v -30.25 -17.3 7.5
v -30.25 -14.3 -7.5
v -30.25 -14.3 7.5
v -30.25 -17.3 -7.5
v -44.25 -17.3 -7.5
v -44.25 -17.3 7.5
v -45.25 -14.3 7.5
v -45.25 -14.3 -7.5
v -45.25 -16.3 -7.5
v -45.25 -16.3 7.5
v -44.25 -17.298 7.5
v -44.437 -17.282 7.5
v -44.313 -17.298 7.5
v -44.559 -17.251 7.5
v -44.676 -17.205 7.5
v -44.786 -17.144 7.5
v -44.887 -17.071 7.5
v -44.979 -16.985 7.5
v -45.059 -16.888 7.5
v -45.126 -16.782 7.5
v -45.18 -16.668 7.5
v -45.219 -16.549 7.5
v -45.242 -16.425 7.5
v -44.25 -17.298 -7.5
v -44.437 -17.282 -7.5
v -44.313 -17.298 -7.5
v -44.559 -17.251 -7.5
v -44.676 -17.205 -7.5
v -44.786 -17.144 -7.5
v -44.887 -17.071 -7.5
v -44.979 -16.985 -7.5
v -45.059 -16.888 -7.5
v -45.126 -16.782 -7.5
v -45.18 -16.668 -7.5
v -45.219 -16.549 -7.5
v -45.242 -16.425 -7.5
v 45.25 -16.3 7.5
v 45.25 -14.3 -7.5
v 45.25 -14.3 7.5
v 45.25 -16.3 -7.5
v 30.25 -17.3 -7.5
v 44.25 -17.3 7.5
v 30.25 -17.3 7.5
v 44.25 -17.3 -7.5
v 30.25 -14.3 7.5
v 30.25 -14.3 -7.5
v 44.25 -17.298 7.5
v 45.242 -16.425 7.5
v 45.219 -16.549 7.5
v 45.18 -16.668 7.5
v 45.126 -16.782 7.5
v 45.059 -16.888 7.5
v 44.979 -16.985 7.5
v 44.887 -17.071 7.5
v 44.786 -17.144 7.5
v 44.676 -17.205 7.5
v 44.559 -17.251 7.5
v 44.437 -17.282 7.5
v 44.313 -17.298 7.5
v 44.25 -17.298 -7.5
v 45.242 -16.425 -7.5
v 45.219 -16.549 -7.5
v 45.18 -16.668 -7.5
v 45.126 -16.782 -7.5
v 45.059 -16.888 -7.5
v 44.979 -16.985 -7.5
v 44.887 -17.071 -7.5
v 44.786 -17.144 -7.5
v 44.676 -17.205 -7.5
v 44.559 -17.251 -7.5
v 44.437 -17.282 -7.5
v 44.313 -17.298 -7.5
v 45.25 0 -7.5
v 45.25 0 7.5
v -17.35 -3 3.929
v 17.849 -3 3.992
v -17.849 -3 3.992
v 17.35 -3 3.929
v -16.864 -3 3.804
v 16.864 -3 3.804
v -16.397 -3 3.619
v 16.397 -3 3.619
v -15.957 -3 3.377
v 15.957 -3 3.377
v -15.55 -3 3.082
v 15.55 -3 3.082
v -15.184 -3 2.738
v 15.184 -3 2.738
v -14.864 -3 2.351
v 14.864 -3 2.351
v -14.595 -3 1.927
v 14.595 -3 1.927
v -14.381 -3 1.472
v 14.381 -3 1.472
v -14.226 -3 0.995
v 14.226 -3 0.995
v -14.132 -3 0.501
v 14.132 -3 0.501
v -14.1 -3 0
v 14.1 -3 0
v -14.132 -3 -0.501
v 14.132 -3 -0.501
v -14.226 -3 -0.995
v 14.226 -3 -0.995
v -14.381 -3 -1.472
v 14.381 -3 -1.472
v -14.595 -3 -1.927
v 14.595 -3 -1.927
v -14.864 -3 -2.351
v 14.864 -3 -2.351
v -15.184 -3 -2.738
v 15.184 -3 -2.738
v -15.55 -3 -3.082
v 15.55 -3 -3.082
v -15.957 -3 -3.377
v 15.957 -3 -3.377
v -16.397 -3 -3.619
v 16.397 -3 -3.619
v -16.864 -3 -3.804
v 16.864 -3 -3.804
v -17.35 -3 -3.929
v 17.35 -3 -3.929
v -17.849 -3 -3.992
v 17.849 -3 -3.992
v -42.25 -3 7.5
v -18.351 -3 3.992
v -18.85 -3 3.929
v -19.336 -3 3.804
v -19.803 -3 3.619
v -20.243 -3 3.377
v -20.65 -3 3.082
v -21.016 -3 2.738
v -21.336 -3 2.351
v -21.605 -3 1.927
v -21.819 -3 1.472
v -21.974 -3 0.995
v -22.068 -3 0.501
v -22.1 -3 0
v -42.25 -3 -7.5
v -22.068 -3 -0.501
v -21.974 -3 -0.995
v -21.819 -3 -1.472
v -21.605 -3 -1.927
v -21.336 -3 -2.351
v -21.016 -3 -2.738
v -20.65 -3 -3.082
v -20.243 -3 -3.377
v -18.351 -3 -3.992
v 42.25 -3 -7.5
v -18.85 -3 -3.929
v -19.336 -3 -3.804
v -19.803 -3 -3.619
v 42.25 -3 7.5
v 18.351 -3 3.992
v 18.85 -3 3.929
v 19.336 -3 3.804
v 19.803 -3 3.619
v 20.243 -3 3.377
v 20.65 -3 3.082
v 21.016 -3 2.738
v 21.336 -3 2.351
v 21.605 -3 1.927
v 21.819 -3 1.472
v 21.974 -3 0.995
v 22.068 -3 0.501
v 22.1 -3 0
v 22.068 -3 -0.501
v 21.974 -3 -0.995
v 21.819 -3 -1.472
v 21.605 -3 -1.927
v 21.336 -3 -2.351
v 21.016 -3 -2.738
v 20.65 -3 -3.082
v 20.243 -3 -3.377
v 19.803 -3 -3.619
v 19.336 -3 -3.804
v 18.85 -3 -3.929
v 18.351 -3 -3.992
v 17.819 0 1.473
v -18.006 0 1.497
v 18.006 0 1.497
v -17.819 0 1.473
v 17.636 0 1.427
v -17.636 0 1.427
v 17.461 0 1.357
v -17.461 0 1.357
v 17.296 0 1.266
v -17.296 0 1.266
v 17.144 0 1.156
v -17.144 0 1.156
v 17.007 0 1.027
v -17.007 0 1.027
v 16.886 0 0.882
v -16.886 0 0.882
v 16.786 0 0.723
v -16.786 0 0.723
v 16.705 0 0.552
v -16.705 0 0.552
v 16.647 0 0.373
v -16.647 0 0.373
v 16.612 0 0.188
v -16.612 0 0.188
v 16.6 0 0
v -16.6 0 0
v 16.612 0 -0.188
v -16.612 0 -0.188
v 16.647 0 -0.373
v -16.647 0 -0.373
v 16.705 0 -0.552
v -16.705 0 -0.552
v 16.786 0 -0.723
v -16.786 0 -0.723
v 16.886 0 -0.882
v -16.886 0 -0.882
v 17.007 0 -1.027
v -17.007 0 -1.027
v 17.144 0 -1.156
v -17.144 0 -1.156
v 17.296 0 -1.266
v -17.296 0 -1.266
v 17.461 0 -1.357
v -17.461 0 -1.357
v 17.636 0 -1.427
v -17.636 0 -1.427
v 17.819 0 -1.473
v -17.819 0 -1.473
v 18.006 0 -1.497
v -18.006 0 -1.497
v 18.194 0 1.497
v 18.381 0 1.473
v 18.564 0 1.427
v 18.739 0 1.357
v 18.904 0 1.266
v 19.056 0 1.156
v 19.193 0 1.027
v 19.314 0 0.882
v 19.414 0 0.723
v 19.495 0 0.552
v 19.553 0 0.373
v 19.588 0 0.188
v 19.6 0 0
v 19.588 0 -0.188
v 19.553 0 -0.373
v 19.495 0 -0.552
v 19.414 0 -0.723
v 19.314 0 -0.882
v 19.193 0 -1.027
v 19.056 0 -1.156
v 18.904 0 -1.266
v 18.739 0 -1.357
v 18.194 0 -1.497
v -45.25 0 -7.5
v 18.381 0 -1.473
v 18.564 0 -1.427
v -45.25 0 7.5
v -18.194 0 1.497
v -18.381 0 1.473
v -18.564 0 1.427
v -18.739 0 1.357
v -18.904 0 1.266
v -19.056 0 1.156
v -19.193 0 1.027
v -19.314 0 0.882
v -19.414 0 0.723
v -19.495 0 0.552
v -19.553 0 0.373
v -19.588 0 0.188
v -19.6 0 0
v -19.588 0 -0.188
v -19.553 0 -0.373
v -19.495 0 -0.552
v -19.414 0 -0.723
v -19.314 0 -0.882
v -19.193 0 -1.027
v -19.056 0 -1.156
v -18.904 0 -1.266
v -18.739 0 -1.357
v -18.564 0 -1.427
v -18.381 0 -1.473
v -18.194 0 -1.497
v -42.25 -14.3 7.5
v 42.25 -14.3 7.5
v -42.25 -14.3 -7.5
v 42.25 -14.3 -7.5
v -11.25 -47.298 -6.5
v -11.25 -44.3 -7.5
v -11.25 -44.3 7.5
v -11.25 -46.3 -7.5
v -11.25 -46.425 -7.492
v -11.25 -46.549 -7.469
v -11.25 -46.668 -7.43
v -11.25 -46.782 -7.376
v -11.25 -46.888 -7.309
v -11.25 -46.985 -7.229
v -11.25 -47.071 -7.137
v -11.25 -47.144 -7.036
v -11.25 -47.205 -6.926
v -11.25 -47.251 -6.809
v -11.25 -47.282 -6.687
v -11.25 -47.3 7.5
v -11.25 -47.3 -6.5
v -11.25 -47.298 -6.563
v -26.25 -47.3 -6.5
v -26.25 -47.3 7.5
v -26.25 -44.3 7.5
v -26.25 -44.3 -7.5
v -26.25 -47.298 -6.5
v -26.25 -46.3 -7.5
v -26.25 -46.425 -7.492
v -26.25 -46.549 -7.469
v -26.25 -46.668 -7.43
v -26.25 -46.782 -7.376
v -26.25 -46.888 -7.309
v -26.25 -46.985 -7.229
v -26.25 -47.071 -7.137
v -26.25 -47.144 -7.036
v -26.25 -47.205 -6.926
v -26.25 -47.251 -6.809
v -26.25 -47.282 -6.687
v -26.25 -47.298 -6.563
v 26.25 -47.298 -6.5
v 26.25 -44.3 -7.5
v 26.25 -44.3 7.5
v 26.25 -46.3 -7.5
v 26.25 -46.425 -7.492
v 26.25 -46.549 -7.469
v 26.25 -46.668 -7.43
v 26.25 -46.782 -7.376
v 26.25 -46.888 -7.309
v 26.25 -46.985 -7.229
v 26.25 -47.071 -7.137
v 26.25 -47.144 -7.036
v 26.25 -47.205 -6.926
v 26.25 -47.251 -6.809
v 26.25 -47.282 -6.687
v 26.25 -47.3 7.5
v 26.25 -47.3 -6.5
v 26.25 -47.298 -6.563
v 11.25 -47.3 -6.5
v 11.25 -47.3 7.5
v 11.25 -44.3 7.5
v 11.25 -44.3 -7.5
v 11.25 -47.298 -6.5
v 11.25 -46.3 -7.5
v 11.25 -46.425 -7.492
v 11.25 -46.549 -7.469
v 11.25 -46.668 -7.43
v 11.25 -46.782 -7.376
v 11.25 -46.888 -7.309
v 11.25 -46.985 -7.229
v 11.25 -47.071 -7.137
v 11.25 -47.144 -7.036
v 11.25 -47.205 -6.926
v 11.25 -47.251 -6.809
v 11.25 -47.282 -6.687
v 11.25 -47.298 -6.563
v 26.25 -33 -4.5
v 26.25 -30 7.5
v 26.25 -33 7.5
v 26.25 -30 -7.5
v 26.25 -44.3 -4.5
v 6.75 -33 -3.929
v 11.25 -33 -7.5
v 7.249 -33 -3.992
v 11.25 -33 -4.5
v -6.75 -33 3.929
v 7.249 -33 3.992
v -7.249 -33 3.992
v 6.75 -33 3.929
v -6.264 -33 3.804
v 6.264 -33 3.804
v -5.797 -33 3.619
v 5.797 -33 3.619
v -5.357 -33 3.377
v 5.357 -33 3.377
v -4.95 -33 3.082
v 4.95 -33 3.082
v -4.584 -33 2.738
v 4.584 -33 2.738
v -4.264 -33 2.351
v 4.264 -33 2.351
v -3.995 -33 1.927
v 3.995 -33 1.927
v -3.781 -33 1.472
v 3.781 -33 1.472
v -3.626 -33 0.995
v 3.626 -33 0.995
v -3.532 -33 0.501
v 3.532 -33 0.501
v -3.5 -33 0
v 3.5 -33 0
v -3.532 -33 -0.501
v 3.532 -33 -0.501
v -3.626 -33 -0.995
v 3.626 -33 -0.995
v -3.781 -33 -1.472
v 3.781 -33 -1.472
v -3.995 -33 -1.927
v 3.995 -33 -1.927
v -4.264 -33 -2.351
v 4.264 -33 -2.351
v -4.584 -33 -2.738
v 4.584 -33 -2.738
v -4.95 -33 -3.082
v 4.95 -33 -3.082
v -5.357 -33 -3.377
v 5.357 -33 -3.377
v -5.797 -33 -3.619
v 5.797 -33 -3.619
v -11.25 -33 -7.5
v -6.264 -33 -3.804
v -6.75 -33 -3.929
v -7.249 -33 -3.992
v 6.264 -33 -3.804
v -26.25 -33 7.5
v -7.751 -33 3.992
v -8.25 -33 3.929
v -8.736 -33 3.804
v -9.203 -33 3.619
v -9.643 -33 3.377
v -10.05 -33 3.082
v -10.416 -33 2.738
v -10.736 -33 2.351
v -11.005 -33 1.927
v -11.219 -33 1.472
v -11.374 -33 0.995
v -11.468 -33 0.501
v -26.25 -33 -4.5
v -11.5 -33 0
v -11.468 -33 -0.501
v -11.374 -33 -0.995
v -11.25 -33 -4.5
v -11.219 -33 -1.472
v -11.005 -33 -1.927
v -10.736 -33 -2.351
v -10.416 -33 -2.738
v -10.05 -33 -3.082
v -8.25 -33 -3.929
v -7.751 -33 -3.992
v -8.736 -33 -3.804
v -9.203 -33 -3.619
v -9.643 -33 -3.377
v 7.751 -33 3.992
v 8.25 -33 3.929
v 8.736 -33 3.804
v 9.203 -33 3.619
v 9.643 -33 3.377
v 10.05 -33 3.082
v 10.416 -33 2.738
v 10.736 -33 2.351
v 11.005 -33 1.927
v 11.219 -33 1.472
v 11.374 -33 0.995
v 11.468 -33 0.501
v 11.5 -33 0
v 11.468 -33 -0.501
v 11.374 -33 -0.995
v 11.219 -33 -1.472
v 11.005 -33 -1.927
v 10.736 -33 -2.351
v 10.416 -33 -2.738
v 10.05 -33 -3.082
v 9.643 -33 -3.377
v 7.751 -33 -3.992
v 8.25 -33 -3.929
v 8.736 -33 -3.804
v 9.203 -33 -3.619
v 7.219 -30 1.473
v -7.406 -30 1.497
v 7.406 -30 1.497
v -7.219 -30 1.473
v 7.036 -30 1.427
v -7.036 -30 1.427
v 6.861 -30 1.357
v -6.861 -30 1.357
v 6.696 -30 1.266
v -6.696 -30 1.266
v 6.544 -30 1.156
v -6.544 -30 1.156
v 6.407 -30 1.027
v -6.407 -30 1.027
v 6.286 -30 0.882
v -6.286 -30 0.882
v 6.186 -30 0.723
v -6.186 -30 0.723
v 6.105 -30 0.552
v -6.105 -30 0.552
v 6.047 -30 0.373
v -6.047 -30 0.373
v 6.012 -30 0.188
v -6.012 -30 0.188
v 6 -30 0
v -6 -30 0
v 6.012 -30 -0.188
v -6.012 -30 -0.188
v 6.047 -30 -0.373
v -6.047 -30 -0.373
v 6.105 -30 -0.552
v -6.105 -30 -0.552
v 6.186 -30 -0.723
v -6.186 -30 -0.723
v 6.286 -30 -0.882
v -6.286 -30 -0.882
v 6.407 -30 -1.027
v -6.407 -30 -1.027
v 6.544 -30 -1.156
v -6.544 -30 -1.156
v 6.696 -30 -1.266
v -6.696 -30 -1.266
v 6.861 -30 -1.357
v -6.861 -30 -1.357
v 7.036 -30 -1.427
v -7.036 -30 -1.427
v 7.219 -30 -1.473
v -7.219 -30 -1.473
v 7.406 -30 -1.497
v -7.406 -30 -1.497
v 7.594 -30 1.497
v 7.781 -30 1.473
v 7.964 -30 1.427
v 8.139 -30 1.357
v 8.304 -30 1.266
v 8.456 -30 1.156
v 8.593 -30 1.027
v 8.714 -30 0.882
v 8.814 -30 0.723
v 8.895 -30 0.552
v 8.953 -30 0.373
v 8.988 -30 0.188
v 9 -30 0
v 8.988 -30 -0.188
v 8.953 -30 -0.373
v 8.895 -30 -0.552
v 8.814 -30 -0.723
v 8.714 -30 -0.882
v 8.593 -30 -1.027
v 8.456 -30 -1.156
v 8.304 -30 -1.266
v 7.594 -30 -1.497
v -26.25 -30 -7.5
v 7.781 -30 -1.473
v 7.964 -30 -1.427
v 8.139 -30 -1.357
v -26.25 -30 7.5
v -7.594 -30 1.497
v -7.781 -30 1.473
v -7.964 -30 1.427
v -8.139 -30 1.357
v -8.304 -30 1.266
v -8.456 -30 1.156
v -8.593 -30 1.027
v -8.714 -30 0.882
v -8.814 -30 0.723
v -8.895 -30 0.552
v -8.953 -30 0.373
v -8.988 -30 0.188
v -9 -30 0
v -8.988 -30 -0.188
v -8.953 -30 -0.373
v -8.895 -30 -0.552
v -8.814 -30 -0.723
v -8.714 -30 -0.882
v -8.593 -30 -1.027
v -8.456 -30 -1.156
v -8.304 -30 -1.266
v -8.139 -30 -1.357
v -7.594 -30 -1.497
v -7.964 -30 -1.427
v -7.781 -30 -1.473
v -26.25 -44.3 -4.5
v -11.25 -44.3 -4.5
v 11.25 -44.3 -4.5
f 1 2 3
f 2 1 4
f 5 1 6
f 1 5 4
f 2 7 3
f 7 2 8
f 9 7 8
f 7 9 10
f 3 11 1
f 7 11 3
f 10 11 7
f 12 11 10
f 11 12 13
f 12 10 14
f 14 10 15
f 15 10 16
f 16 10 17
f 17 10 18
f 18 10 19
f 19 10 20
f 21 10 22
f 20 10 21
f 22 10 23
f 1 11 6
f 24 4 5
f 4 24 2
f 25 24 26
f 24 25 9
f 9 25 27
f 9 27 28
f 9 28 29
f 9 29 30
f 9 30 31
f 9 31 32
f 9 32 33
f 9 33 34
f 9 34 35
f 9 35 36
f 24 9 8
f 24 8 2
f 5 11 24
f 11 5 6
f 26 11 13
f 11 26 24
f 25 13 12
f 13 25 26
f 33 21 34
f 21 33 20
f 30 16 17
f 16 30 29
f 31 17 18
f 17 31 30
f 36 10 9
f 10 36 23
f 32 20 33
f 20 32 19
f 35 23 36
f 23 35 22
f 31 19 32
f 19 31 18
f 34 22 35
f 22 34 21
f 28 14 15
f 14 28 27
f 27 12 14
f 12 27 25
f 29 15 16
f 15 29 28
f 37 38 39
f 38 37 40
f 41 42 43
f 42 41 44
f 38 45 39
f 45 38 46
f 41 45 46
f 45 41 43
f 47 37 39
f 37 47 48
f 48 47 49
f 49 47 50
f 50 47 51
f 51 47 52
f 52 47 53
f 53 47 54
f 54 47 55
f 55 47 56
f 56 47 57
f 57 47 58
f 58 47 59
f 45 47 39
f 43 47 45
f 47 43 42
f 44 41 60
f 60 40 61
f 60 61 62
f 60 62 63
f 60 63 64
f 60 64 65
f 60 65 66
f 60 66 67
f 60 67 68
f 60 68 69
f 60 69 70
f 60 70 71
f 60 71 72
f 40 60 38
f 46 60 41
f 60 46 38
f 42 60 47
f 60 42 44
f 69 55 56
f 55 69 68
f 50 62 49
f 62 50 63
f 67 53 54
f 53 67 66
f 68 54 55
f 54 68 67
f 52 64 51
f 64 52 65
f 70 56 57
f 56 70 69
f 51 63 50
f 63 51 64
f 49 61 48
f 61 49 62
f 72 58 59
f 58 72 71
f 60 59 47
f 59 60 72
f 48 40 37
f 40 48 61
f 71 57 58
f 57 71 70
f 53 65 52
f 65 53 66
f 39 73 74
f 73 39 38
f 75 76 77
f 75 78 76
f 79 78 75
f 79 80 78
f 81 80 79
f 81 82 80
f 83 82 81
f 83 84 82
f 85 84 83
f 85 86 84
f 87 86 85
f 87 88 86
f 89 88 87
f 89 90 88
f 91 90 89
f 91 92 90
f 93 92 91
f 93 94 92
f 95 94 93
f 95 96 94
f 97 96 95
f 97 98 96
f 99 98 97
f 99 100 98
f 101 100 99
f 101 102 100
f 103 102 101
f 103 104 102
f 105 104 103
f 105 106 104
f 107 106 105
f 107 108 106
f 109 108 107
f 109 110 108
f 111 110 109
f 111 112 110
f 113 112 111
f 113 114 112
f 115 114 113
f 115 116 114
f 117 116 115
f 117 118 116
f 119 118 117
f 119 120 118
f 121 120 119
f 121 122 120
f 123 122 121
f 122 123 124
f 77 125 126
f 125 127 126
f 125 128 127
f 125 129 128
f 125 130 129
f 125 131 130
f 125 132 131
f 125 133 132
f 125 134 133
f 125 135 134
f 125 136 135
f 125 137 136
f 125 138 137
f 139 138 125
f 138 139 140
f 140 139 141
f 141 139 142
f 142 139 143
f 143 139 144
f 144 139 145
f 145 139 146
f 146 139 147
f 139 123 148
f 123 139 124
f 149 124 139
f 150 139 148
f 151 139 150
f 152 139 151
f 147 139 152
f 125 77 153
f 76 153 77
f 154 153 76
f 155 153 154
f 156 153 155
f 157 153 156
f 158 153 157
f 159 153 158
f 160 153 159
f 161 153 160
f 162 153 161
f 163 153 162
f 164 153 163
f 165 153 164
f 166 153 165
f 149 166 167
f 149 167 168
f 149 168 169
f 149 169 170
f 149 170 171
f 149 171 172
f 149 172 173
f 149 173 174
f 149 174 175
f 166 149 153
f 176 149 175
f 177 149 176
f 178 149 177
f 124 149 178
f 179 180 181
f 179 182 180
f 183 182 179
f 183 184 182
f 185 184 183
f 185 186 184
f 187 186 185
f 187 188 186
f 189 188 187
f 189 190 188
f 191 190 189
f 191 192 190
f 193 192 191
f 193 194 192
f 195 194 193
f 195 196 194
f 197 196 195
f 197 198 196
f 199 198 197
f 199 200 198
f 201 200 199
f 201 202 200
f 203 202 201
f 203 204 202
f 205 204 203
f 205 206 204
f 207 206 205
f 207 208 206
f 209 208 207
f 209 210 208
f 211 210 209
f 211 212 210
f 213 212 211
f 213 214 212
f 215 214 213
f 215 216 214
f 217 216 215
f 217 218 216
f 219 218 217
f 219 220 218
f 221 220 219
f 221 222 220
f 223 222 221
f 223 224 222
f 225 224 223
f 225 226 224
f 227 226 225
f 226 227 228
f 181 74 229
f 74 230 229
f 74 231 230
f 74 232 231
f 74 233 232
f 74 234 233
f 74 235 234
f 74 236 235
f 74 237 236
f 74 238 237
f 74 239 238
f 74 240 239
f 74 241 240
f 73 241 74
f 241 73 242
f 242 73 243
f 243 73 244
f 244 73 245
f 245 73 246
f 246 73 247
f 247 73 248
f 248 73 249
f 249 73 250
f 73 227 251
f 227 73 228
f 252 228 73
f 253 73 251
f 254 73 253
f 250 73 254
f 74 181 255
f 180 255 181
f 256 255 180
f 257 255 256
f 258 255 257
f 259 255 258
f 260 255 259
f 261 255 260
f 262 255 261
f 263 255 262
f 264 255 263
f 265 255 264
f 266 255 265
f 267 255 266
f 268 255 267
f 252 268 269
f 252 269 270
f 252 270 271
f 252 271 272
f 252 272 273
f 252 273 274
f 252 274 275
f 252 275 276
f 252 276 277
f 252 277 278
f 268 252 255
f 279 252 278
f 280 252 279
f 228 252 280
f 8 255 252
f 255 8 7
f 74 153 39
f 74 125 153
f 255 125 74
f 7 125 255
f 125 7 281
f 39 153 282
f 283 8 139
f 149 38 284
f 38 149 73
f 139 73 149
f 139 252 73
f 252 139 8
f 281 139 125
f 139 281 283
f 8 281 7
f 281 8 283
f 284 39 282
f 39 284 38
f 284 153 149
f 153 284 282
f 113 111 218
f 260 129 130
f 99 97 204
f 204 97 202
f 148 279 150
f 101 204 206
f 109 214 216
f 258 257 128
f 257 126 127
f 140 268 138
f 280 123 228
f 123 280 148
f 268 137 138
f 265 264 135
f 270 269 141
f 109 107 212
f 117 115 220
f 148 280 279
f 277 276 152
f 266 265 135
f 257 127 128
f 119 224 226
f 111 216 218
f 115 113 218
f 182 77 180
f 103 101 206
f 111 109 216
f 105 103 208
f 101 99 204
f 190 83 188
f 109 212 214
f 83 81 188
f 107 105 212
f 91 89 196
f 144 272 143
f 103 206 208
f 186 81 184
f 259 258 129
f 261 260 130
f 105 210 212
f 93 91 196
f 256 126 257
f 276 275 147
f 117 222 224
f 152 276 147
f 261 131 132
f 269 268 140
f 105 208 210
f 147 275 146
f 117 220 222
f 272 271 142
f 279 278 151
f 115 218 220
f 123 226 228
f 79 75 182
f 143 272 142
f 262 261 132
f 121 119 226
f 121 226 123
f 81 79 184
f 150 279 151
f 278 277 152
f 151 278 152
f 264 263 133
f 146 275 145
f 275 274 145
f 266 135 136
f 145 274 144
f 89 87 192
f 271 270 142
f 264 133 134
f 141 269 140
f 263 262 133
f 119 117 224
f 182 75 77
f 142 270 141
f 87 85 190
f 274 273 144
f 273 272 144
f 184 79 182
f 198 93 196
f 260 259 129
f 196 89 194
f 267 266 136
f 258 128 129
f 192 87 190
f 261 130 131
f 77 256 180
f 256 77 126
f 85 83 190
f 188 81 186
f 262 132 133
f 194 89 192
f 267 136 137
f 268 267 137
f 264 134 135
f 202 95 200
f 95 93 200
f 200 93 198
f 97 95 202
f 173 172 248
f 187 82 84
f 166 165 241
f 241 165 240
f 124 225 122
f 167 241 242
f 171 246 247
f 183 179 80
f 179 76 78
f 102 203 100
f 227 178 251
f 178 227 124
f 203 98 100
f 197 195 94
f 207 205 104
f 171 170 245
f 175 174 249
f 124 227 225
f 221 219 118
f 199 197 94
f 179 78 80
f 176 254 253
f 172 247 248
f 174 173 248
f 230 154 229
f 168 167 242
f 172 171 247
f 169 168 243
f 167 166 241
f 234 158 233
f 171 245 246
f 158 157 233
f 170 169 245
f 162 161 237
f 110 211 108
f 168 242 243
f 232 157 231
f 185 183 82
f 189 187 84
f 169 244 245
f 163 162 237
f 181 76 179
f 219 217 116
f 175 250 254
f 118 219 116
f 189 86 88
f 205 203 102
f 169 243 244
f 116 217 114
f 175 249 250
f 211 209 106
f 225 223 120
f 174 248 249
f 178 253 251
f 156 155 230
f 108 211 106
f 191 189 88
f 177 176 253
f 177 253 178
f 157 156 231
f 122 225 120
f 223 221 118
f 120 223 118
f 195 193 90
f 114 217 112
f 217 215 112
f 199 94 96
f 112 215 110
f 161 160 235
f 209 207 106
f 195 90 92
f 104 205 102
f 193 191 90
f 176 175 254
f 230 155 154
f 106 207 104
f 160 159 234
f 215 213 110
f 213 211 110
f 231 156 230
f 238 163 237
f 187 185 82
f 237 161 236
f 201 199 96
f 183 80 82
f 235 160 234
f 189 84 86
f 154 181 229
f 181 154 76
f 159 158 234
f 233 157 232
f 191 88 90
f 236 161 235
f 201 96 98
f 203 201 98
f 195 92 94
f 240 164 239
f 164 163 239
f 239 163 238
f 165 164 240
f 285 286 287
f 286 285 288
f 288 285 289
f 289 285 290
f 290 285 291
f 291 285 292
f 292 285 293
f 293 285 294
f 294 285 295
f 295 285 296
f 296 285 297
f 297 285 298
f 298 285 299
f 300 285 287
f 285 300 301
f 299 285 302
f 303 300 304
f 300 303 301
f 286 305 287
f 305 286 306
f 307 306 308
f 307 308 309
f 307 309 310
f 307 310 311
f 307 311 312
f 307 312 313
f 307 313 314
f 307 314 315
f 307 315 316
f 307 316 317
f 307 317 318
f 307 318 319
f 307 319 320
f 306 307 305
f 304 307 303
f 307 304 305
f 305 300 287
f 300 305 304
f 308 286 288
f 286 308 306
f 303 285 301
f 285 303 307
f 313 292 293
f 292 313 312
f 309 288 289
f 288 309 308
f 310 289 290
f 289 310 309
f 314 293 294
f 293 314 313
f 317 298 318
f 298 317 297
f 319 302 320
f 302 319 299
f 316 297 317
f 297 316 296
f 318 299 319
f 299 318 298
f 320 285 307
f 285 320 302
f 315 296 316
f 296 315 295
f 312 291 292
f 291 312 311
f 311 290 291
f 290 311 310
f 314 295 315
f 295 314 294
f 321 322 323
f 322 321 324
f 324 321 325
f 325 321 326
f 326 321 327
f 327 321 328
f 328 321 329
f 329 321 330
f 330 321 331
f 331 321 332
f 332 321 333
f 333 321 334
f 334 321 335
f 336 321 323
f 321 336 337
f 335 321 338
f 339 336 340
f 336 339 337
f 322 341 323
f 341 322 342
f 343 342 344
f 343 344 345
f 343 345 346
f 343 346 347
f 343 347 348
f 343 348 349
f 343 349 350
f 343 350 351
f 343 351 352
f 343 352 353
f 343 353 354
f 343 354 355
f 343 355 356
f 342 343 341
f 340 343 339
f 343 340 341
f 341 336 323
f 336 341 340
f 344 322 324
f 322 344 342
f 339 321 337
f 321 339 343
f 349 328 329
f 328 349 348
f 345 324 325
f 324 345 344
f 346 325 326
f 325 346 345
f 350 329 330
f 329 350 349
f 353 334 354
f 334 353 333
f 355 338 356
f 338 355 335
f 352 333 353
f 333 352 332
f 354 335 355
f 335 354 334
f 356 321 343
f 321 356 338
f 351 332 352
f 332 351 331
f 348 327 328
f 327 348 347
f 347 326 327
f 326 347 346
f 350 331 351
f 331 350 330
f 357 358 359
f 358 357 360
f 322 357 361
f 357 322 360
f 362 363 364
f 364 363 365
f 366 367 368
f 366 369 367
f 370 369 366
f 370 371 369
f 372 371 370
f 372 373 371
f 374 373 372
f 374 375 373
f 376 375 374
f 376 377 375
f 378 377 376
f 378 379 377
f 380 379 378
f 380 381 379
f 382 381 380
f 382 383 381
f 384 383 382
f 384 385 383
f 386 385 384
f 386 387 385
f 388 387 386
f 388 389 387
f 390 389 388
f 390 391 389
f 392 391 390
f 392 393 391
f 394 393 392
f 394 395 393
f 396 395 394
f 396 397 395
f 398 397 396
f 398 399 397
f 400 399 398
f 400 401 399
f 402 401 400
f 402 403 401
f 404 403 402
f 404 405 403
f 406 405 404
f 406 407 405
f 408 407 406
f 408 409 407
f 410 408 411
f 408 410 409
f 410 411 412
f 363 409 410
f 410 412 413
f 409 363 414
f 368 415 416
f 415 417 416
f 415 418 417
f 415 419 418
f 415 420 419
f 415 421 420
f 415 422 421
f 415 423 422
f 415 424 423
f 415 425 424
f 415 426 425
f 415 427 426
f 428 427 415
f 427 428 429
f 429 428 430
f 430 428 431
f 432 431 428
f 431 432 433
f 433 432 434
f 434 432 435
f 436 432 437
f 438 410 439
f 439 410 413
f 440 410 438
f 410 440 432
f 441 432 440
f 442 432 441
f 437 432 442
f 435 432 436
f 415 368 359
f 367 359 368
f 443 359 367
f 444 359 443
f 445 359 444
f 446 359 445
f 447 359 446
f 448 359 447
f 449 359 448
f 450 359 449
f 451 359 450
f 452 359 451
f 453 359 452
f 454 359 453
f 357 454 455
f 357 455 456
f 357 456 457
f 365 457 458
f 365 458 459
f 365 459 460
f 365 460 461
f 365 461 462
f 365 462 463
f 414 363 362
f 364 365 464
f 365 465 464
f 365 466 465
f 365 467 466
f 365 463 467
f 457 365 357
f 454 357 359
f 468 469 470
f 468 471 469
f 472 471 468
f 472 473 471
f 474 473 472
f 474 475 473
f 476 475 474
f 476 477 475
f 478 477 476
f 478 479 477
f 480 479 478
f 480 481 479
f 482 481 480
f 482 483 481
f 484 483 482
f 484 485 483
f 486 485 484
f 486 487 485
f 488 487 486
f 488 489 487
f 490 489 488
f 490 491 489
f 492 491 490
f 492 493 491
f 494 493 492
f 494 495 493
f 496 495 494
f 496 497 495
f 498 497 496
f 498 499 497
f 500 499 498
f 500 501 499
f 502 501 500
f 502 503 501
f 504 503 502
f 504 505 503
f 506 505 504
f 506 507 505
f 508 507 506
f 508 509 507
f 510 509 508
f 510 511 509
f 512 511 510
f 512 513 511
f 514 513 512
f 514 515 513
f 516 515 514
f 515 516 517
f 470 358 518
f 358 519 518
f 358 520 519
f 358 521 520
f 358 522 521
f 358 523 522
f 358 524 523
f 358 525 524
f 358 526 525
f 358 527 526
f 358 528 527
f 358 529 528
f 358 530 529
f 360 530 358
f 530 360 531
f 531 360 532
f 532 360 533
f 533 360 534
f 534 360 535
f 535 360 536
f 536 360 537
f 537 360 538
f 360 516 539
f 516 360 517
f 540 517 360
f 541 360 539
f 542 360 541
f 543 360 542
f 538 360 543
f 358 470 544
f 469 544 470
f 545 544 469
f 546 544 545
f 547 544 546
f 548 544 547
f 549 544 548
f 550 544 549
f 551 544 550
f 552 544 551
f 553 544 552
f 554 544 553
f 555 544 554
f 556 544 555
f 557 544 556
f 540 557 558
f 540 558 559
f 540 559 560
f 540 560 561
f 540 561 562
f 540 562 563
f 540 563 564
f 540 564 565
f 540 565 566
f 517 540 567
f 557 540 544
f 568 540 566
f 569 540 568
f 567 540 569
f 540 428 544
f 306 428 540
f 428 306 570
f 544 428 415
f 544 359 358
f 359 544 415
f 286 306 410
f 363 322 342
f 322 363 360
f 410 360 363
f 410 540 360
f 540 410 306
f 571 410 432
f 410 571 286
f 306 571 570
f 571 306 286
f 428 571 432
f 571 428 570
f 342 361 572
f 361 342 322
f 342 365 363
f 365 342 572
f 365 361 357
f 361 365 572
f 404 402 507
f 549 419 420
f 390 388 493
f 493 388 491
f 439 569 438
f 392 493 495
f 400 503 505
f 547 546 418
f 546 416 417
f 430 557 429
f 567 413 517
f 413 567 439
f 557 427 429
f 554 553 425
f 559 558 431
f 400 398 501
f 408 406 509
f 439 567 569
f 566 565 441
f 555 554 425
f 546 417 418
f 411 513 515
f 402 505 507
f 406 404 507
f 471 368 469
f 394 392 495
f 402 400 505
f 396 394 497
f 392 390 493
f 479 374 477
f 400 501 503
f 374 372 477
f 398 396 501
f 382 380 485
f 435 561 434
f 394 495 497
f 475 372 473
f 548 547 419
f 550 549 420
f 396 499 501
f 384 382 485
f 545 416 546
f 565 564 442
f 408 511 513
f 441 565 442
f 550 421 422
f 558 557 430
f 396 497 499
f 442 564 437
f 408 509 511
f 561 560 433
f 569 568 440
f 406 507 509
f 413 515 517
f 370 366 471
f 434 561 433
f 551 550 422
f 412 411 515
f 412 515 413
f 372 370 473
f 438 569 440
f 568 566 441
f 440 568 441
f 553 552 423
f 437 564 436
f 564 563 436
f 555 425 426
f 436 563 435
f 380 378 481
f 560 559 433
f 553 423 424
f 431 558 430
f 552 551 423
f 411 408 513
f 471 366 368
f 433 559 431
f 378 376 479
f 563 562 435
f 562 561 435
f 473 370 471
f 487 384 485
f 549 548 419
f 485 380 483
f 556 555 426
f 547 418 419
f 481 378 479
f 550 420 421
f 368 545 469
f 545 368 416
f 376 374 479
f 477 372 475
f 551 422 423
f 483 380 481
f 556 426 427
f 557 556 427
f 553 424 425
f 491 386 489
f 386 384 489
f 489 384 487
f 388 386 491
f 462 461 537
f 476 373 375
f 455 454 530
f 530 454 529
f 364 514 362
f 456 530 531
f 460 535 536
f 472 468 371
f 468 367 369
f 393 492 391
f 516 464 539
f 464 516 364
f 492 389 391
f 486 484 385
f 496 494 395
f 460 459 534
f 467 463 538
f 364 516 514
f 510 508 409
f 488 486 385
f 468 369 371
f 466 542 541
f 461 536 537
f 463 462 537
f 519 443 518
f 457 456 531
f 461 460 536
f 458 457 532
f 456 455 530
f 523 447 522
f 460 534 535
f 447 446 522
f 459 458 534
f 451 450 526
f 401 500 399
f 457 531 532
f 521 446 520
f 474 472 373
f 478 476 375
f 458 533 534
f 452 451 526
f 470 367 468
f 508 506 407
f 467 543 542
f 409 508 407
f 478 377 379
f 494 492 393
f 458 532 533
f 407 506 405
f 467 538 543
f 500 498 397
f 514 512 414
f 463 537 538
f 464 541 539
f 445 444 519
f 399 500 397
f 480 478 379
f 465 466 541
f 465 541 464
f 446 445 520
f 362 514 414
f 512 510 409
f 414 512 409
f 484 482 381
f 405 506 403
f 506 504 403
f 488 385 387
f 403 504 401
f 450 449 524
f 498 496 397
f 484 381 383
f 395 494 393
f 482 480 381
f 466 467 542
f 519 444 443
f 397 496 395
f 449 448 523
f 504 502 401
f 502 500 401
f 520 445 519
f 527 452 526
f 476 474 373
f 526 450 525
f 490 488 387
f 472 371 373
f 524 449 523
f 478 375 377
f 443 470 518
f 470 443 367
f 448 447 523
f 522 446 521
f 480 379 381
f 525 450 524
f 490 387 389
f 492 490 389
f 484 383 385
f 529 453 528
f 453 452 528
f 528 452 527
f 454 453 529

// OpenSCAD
/**
 * Bracket for mounting a device (e.g. small external hard drive) to a wall. The top bracket slides on 
 * and the bottom bracket sits below
 * 
 * @license GPL
 * @author Alex Kazim
 */


/* [Main] */
// width of the device
device_width = 82.5;

// thickness of the device
device_height = 11.3;

// thickness of the bracket
wall_thickness = 3;

// rendering quality
$fn = 50;

// build in two pieces
Top();
Bottom();

/**
 * Draw the top bracket
 */
module Top() {
	back_l = device_width + (2 * wall_thickness) + 2;	// + 2 for clearance
	back_w = 15;
	side_h = device_height;
	front_l = 15;
	
	rotate([90,0,0]) {
		difference() {
			union() {
				// back
				translate([-back_l/2,-back_w/2,0]) {
					color("blue") cube([back_l,back_w,wall_thickness]);
				}
				
				// sides
				translate([-back_l/2,-back_w/2,wall_thickness]) {
					color("yellow") cube([wall_thickness,back_w,side_h]);
				}
				translate([back_l/2 - wall_thickness,-back_w/2,wall_thickness]) {
					color("yellow") cube([wall_thickness,back_w,side_h]);
				}
				
				// fronts
				translate([-back_l/2,-back_w/2,side_h + wall_thickness]) {
					RadiusEdge(front_l,back_w,wall_thickness,0,1);
				}
				translate([back_l/2 - front_l,-back_w/2,side_h + wall_thickness]) {
					RadiusEdge(front_l,back_w,wall_thickness,2,1);
				}
			}
			
			// screwholes
			translate([-back_l/5,0,0]) {
				Screwhole(8,wall_thickness);
			}
			translate([back_l/5,0,0]) {
				Screwhole(8,wall_thickness);
			}
		}
	}
}	// Top

/**
 * Draw the bottom bracket
 */
module Bottom() {
	back_l = device_width - 30;
	back_w = 15;
	side_h = device_height;
	
	translate([0,-back_w * 2,0]) {
		rotate([90,0,0]) {
			difference() {
				union() {
					// back
					translate([-back_l/2,-back_w/2,0]) {
						color("blue") cube([back_l,back_w,wall_thickness]);
					}
					// sides
					translate([-back_l/2,-back_w/2,wall_thickness]) {
						color("yellow") cube([back_w,wall_thickness,side_h]);
					}
					translate([back_l/2 - back_w,-back_w/2,wall_thickness]) {
						color("yellow") cube([back_w,wall_thickness,side_h]);
					}
					
					// fronts
					translate([-back_l/2,-back_w/2,side_h + wall_thickness]) {
						RadiusEdge(back_w,back_w,wall_thickness,3,1);
					}
					translate([back_l/2 - back_w,-back_w/2,side_h + wall_thickness]) {
						RadiusEdge(back_w,back_w,wall_thickness,3,1);
					}
				}
				
				// screwholes
				translate([-back_w/2,0,0]) {
					Screwhole(8,wall_thickness);
				}
				translate([back_w/2,0,0]) {
					Screwhole(8,wall_thickness);
				}
			}	
		}
	}
}	// Bottom

/**
 * Render a screwhole with a countersink. Meant to be called 
 * within a difference()
 * @param d - diam of the screwhead
 * @param h - height of the screwhole
 */
module Screwhole(d,h) {
	sink_h = 3;
	inner_d = d - 5;	// assume a 5mm change in diam for the screwhead
	cylinder(d1=inner_d,d2=d,h=h);			// countersink
	cylinder(d1=inner_d,d2=inner_d,h=h);	// rest of the screwhole
}	// Screwhole

/**
 * Radius an edge of the top face of a cube; uses the edge to pre-determine the 
 * coordinates and dimensions and calls a common module; have to call the module 
 * each time within the if scope or the variables won't be accessible
 * @param c_v - vector [length,width,height]
 * @param e - edge to radius; 0 = left, 1 = top, 2 = right, 3 = bottom
 * @param r - radius of the edge
 */
module RadiusEdge(l,w,h,e,r) {
	if (e == 0) {
		cutout_loc = [0,0,h-r];
		cutout_size = [r,w,r];
		corner_loc = [r,0,h-r];
		corner_rot = [-90,0,0];
		corner_l = w;
		doEdge([l,w,h],r,cutout_loc,cutout_size,corner_loc,corner_rot,corner_l);
	}
	else if (e == 1) {
		cutout_loc = [0,w-r,h-r];
		cutout_size = [l,r,r];
		corner_loc = [0,w-r,h-r];
		corner_rot = [-90,0,-90];
		corner_l = l;
		doEdge([l,w,h],r,cutout_loc,cutout_size,corner_loc,corner_rot,corner_l);
	}
	else if (e == 2) {
		cutout_loc = [l-r,0,h-r];
		cutout_size = [r,w,r];
		corner_loc = [l-r,0,h-r];
		corner_rot = [-90,0,0];
		corner_l = w;
		doEdge([l,w,h],r,cutout_loc,cutout_size,corner_loc,corner_rot,corner_l);
	}
	else if (e == 3) {
		cutout_loc = [0,0,h-r];
		cutout_size = [l,r,r];
		corner_loc = [0,r,h-r];
		corner_rot = [-90,0,-90];
		corner_l = l;
		doEdge([l,w,h],r,cutout_loc,cutout_size,corner_loc,corner_rot,corner_l);
	}
}	// RadiusEdge

/**
 * Draw a cube with a radiused edge. Does this by first removing the edge and 
 * then adding a cylinder
 * 
 * @param c_v - cube dimensions (vector)
 * @param r - radius of the corner
 * @param cutout_loc - location where to start the cutout (vector)
 * @param cutout_size - size of the cube (vector)
 * @param corner_loc - location for the cylinder (vector)
 * @param corner_rot - rotation to put cylinder in right place (vector)
 * @param corner_l - length of the corner; depends on the orientation
 */
module doEdge(c_v,r,cutout_loc,cutout_size,corner_loc,corner_rot,corner_l) {
	difference() {
		color("white") cube(c_v);
		translate(cutout_loc) {
			color("red") cube(cutout_size);
		}
	}
	translate(corner_loc) {
		rotate(corner_rot) {
			color("pink") cylinder(r=r,h=corner_l);
		}
	}
}	// doEdge
